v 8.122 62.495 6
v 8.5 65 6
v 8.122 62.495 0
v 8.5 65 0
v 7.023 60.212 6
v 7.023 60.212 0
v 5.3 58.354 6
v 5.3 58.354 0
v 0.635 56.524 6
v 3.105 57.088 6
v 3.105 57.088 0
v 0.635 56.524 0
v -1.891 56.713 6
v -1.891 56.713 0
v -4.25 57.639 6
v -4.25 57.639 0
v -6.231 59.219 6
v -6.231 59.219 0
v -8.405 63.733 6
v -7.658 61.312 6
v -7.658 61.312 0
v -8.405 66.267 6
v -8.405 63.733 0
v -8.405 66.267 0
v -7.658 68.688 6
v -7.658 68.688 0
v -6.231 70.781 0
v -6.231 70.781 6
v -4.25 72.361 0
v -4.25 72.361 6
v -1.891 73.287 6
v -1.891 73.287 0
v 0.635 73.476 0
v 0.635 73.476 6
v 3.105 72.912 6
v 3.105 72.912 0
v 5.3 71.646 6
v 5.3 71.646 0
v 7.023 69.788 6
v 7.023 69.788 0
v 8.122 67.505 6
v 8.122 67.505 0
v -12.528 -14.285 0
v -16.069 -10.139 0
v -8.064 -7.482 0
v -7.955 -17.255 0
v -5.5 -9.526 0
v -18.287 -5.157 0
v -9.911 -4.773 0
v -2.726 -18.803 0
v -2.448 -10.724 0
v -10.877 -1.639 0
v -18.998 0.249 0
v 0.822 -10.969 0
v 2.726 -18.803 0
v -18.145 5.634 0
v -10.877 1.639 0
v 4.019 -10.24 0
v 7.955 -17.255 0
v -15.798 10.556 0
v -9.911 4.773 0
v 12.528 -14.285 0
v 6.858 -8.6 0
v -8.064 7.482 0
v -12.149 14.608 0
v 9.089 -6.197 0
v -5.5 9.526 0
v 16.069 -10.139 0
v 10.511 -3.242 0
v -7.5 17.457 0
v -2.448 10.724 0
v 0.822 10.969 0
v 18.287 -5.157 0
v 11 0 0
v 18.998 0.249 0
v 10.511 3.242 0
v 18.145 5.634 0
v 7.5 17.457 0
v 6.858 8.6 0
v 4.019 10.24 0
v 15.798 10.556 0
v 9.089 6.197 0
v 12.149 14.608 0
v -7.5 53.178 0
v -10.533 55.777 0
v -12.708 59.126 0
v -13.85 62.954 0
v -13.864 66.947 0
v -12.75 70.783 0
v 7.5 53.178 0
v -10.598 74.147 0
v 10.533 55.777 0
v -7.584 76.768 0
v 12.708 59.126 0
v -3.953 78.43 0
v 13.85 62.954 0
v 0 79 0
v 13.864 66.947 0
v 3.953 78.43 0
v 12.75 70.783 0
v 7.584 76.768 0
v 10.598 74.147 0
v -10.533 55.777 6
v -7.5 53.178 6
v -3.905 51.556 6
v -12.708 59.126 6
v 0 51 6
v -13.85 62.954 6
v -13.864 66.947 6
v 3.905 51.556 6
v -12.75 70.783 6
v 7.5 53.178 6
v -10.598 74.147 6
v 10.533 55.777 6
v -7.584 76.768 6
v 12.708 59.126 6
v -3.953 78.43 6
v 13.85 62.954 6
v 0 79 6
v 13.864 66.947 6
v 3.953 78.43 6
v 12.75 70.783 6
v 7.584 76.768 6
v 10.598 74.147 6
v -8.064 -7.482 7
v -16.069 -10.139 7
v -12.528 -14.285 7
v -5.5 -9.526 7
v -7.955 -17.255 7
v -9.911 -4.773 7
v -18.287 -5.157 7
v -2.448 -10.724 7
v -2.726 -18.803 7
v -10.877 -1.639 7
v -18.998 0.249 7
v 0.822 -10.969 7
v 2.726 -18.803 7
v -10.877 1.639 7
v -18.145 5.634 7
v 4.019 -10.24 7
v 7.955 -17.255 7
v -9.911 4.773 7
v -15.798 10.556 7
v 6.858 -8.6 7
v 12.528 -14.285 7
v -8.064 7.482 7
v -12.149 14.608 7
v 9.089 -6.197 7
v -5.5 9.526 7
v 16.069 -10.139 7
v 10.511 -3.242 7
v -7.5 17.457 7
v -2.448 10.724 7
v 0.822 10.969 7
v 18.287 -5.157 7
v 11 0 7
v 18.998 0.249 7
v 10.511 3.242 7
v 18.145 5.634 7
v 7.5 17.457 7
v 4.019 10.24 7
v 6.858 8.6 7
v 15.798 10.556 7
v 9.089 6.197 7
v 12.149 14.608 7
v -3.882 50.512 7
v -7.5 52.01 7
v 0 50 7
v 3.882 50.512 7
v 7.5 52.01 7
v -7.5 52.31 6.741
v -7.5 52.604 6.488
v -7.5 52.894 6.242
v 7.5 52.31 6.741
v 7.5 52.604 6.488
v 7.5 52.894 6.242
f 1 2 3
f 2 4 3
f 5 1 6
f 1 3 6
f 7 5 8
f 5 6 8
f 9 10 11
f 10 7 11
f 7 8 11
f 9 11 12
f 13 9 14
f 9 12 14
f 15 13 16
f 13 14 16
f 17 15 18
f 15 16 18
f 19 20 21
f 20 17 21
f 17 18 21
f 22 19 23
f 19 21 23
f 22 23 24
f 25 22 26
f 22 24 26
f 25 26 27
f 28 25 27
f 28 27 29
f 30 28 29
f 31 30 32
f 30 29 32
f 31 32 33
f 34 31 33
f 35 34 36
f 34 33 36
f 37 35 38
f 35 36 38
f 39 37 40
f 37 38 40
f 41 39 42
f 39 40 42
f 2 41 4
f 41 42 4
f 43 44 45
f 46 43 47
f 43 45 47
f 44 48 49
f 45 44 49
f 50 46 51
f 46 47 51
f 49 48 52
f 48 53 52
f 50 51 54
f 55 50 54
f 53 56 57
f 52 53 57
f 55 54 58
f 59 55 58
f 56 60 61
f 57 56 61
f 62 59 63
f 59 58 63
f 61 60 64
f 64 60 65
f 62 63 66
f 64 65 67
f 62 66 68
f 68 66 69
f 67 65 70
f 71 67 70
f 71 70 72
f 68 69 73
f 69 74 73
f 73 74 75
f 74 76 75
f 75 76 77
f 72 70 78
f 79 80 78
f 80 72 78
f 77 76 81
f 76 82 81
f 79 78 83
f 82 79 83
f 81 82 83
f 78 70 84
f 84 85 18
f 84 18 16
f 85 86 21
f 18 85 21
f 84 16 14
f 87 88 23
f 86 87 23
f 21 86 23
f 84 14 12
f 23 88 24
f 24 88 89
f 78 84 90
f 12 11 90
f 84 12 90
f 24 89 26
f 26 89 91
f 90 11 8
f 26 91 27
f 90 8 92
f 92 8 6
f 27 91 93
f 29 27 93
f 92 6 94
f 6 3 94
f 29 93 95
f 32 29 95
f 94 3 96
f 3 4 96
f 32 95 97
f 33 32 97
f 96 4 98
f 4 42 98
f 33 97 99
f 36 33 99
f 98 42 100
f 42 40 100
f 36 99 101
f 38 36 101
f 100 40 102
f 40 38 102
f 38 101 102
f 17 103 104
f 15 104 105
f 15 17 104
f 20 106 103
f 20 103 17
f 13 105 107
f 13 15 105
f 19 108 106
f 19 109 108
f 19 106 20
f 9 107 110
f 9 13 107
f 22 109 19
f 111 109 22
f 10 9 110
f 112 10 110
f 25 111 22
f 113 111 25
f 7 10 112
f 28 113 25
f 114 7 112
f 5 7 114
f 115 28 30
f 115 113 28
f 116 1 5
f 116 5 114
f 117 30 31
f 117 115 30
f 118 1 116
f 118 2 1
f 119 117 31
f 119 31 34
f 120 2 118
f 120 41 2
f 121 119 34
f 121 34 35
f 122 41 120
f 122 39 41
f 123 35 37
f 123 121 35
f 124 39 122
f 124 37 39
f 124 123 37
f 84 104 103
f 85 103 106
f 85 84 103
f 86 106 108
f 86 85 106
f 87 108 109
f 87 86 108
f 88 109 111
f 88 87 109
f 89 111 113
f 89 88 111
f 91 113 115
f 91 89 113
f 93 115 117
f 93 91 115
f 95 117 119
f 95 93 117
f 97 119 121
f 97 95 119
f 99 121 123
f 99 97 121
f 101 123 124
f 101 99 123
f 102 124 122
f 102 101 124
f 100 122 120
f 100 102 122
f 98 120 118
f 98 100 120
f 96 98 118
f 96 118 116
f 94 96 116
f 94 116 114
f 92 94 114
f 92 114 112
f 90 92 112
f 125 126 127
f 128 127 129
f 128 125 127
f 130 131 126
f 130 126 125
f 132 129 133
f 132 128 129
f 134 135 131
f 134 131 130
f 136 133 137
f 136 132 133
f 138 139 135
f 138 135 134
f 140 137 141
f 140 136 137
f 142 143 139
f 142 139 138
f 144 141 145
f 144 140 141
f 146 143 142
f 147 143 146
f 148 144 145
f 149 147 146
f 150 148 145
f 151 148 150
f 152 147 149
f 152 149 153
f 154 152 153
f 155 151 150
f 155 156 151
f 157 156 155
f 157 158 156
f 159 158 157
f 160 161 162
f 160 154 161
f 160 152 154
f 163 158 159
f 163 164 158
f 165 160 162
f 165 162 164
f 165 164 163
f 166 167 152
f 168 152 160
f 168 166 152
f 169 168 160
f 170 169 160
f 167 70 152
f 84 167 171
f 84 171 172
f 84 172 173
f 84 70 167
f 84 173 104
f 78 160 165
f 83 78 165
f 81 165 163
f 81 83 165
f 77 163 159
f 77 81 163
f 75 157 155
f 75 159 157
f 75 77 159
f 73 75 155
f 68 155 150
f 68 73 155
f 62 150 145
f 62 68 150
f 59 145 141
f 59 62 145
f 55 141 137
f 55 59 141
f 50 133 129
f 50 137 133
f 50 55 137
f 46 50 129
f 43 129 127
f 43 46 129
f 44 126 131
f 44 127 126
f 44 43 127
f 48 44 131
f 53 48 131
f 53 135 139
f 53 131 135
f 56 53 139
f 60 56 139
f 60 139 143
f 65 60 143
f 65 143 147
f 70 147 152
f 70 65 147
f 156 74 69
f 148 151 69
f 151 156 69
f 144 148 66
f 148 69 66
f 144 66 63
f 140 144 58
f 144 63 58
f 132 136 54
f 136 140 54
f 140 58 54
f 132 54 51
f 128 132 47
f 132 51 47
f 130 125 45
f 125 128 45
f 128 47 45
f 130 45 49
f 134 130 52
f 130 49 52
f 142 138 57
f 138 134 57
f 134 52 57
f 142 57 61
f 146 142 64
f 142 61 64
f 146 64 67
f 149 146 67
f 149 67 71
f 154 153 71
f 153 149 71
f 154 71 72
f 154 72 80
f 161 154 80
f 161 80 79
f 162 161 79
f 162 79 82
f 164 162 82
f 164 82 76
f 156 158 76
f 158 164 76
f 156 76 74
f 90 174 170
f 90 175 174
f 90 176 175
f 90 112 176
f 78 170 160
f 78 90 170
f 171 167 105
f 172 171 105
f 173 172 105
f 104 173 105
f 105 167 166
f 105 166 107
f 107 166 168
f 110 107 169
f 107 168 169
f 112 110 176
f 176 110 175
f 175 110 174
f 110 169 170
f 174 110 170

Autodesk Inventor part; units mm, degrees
ref_plane "YZ Plane" through (0, 0, 0) normal (1, 0, 0) x (0, 1, 0)
ref_plane "XZ Plane" through (0, 0, 0) normal (0, 1, 0) x (-1, 0, 0)
ref_plane "XY Plane" through (0, 0, 0) normal (0, 0, 1) x (1, 0, 0)
sketch "Sketch1" plane through (0, 0, 0) normal (0, 0, 1) x (1, 0, 0)
  line L0 (0, 0) -> (0, 65) construction
  circle A0 centre (0, 0) radius 11
  circle A1 centre (0, 65) radius 8.5
  line L1 (7.5, 17.4571) -> (-7.5, 17.4571)
  line L2 (-7.5, 17.4571) -> (-7.5, 53.1784)
  line L3 (-7.5, 53.1784) -> (7.5, 53.1784)
  line L4 (7.5, 53.1784) -> (7.5, 17.4571)
  line L5 (7.5, 17.4571) -> (-7.5, 53.1784) construction
  line L6 (-7.5, 17.4571) -> (7.5, 53.1784) construction
  arc A2 (7.5, 53.1784) -> (-7.5, 53.1784) centre (0, 65) ccw
  arc A3 (-7.5, 17.4571) -> (7.5, 17.4571) centre (0, 0) ccw
  point P0 (0, 35.3177)
  point P1 (0, 35.3177)
  dimension "d0" = 22
  dimension "d1" = 17
  dimension "d2" = 65
  dimension "d3" = 5.5
  dimension "d4" = 8
  dimension "d5" = 15
extrude "Extrusion1" add sketch "Sketch1" along normal blind 7
sketch "Sketch2" plane through (0, 0, 7) normal (0, 0, 1) x (1, 0, 0)
  circle A0 centre (0, 65) radius 8.5 projected
  arc A1 (7.5, 53.1784) -> (-7.5, 53.1784) centre (0, 65) ccw projected
  circle A2 centre (0, 65) radius 14
extrude "Extrusion2" cut sketch "Sketch2" against normal blind 1
chamfer "Chamfer1" distance 1 angle 45 1 edges at (0, 51, 7)
properties part number "con rod"
